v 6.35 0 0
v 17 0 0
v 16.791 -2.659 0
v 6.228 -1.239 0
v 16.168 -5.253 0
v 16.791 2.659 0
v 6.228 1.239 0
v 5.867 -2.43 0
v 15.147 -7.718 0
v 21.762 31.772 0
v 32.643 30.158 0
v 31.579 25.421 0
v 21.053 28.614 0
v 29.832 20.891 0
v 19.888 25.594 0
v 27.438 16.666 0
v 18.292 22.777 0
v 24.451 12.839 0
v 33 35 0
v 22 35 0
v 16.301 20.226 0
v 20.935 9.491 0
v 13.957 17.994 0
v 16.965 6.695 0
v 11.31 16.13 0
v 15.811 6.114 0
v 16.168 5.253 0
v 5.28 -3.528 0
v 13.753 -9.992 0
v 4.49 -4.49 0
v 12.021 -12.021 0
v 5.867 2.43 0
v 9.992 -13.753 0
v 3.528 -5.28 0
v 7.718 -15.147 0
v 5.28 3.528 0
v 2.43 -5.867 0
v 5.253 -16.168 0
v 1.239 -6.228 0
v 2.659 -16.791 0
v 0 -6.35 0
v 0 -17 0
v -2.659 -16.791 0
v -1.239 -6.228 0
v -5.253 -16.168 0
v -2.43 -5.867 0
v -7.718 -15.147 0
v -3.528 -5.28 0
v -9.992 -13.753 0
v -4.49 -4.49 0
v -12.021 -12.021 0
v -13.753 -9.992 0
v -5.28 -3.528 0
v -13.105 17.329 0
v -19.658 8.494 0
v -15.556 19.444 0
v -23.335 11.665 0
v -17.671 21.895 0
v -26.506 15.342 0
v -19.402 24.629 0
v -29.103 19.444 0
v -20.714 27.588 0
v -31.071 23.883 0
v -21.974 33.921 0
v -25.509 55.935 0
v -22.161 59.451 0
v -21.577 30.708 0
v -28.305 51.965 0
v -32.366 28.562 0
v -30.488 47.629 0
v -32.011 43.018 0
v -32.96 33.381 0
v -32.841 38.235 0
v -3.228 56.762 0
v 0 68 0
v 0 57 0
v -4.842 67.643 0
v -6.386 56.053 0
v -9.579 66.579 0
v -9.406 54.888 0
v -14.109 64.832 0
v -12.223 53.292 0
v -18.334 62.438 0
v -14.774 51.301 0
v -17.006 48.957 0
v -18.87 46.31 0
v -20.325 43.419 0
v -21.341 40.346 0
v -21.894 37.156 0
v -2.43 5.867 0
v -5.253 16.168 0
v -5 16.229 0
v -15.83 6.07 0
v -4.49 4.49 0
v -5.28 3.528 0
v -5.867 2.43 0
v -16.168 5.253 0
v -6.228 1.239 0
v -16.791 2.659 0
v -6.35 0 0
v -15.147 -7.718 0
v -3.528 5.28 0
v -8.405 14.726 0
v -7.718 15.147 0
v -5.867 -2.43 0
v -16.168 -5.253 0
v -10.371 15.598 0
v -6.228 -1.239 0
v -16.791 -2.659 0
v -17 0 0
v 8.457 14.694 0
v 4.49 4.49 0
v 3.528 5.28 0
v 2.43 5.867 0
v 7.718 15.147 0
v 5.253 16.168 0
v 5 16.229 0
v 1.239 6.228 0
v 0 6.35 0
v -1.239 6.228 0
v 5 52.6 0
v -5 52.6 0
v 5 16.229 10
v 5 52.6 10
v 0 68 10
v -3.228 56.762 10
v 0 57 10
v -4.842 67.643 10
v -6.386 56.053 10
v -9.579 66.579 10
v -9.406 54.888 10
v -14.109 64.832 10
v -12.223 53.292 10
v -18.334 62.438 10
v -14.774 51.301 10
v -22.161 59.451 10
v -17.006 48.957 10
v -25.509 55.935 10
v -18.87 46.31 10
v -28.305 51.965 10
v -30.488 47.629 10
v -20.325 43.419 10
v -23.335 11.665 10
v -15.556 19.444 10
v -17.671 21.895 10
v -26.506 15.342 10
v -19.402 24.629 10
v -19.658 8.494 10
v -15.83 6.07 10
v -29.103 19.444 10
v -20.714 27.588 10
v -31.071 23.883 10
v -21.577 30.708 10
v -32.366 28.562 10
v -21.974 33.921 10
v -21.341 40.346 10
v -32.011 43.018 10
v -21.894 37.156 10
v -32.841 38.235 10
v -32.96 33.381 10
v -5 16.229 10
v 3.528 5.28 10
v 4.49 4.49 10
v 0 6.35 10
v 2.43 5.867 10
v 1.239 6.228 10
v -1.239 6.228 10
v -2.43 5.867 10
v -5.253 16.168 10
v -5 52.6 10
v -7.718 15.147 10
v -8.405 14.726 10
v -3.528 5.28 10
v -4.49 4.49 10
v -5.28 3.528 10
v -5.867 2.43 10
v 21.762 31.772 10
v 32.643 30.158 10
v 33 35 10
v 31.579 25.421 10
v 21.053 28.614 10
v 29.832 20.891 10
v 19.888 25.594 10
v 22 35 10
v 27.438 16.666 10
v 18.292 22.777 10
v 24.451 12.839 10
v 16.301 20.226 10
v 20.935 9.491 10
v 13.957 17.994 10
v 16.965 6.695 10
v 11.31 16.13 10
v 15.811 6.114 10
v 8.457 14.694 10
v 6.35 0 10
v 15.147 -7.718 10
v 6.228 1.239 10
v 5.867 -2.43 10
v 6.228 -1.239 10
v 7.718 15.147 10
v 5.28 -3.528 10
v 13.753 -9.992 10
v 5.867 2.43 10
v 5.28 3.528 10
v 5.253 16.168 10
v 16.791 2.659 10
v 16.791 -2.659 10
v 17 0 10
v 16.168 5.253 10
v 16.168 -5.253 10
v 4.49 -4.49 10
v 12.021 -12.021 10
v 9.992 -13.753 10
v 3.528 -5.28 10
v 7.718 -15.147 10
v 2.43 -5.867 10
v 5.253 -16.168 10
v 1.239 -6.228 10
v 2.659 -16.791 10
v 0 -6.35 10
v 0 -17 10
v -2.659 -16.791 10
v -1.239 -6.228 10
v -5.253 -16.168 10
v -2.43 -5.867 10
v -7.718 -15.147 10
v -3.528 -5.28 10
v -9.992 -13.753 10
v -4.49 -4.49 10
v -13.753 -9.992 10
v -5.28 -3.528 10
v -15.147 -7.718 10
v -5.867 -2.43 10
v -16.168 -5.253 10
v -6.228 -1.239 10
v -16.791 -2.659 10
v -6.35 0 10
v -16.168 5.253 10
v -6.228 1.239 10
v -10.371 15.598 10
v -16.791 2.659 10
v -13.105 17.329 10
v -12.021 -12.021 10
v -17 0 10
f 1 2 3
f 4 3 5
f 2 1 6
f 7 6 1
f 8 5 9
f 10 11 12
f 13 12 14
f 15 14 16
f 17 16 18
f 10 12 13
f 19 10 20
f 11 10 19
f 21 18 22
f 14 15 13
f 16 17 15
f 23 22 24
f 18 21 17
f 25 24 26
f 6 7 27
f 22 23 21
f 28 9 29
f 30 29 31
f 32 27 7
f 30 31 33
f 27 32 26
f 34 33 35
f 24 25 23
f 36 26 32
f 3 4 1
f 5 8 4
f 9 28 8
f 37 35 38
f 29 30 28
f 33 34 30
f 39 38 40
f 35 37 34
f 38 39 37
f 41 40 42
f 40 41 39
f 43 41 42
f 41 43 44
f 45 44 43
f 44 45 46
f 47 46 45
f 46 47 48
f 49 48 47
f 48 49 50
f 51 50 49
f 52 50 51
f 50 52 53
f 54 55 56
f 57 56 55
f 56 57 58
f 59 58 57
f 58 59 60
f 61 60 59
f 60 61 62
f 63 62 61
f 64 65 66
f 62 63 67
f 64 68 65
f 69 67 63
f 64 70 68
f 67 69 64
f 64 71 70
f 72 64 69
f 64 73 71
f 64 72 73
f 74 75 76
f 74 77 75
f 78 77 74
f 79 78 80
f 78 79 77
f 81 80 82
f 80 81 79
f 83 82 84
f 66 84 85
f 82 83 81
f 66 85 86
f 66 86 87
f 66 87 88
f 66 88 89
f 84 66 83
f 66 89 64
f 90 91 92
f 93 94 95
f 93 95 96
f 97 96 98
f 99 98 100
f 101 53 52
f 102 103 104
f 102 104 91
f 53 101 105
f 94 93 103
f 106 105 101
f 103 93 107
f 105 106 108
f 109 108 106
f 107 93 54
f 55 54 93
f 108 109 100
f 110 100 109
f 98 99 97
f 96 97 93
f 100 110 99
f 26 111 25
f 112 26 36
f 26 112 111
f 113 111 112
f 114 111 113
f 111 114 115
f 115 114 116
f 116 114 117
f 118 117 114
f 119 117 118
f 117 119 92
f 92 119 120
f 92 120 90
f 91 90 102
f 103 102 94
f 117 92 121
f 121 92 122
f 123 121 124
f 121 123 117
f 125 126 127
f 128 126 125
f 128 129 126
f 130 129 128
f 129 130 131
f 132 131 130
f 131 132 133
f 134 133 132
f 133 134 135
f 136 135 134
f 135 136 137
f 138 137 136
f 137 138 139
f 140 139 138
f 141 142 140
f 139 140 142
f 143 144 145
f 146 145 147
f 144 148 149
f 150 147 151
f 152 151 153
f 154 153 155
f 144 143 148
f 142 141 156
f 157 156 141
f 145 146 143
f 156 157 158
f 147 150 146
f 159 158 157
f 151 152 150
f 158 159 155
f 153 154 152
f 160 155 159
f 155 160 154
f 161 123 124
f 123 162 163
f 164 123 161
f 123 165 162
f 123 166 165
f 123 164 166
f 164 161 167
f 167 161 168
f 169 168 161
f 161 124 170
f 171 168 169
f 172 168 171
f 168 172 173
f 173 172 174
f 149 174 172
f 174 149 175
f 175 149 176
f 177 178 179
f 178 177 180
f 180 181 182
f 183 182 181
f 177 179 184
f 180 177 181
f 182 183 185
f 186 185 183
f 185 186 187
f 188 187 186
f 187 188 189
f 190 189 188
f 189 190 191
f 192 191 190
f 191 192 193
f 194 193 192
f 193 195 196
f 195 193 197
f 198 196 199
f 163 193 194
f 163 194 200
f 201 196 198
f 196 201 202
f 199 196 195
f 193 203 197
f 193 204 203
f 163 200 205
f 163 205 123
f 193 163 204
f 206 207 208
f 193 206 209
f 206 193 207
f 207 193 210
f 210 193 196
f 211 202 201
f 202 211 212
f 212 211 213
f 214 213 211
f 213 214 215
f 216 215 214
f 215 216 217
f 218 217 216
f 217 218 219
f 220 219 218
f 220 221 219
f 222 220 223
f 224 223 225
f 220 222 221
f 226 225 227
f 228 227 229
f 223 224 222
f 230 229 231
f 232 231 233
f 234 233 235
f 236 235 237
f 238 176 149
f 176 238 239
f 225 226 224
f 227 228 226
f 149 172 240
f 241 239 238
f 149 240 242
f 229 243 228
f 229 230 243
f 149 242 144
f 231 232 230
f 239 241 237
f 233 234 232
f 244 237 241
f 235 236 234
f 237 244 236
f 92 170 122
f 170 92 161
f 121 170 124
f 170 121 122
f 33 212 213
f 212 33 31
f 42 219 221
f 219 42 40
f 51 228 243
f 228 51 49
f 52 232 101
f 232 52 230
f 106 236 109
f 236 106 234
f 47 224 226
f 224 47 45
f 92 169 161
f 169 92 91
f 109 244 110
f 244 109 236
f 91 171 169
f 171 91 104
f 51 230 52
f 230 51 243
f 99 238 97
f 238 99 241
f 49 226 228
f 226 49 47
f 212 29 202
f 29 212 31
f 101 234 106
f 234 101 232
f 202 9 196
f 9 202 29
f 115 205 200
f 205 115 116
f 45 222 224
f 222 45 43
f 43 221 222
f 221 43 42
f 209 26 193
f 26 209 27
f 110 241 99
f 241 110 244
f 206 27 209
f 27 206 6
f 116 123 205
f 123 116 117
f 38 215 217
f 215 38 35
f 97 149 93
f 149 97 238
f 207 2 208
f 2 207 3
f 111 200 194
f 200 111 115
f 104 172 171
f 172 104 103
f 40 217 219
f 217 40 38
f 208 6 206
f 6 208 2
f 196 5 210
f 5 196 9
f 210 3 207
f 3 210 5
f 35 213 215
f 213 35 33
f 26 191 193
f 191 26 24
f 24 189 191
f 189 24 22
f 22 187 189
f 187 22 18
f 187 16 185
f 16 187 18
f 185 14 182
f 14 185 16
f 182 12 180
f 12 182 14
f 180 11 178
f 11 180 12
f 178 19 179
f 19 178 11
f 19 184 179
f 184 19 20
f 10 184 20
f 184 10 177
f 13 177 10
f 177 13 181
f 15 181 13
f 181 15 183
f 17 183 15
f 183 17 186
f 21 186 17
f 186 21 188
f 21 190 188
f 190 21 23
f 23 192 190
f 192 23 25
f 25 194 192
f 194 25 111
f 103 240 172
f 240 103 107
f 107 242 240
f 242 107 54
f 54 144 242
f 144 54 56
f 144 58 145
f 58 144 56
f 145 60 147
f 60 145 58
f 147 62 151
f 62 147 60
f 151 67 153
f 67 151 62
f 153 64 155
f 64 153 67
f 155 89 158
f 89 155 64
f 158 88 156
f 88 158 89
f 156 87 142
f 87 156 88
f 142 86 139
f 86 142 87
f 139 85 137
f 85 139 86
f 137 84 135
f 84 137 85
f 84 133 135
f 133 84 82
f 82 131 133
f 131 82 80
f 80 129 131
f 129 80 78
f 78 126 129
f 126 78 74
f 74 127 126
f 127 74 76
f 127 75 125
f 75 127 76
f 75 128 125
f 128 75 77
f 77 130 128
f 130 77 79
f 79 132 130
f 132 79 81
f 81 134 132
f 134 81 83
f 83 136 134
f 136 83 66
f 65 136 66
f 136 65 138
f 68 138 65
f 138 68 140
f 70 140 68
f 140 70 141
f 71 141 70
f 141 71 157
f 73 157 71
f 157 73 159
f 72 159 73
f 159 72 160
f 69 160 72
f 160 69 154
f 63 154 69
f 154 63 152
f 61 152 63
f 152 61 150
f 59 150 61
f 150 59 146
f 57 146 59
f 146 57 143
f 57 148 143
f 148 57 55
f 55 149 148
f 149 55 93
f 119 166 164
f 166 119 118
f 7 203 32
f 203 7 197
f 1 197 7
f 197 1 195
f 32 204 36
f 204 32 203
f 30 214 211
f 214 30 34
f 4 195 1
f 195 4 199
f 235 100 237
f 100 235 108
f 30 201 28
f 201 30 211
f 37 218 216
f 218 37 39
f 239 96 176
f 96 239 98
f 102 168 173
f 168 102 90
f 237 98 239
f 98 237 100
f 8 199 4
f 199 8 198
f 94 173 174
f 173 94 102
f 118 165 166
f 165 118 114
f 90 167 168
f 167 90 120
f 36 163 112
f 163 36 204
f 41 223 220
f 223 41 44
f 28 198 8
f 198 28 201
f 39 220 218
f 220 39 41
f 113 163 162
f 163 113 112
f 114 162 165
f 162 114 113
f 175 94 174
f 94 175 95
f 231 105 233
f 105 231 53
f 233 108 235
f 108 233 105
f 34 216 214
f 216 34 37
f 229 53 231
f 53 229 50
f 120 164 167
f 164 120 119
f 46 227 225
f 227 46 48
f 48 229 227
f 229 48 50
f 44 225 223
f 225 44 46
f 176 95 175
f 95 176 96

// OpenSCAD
$fn = 32;

// ----------------------------------------------------------------------
// Hook: 70 mm shank into a 22 mm curl, 10 mm thick
// ----------------------------------------------------------------------

// --- parameters (mm) ---
shank_len = 70;           // shank length from the boss centre
shank_w = 10;             // shank width
boss_d = 34;              // boss diameter
bore_d = 12.7;            // boss bore
curl_in = 22;             // curl inner radius
curl_out = 33;            // curl outer radius
curl_sweep = 270;         // curl sweep angle
hook_t = 10;              // hook thickness

shank_profile = [[-5, 52.6], [5, 52.6], [5, 15], [-5, 15]];
boss_profile = [[17, 0], [16.791, 2.659], [16.168, 5.253], [15.147, 7.718], [13.753, 9.992], [12.021, 12.021], [9.992, 13.753], [7.718, 15.147], [5.253, 16.168], [2.659, 16.791], [0, 17], [-2.659, 16.791], [-5.253, 16.168], [-7.718, 15.147], [-9.992, 13.753], [-12.021, 12.021], [-13.753, 9.992], [-15.147, 7.718], [-16.168, 5.253], [-16.791, 2.659], [-17, 0], [-16.791, -2.659], [-16.168, -5.253], [-15.147, -7.718], [-13.753, -9.992], [-12.021, -12.021], [-9.992, -13.753], [-7.718, -15.147], [-5.253, -16.168], [-2.659, -16.791], [0, -17], [2.659, -16.791], [5.253, -16.168], [7.718, -15.147], [9.992, -13.753], [12.021, -12.021], [13.753, -9.992], [15.147, -7.718], [16.168, -5.253], [16.791, -2.659]];
curl_profile = [[0, 68], [-4.842, 67.643], [-9.579, 66.579], [-14.109, 64.832], [-18.334, 62.438], [-22.161, 59.451], [-25.509, 55.935], [-28.305, 51.965], [-30.488, 47.629], [-32.011, 43.018], [-32.841, 38.235], [-32.96, 33.381], [-32.366, 28.562], [-31.071, 23.883], [-29.103, 19.444], [-26.506, 15.342], [-23.335, 11.665], [-19.658, 8.494], [-15.556, 5.897], [-11.117, 3.929], [-6.438, 2.634], [-1.619, 2.04], [3.235, 2.159], [8.018, 2.989], [12.629, 4.512], [16.965, 6.695], [20.935, 9.491], [24.451, 12.839], [27.438, 16.666], [29.832, 20.891], [31.579, 25.421], [32.643, 30.158], [33, 35], [22, 35], [21.762, 31.772], [21.053, 28.614], [19.888, 25.594], [18.292, 22.777], [16.301, 20.226], [13.957, 17.994], [11.31, 16.13], [8.419, 14.675], [5.346, 13.659], [2.156, 13.106], [-1.079, 13.026], [-4.292, 13.423], [-7.412, 14.286], [-10.371, 15.598], [-13.105, 17.329], [-15.556, 19.444], [-17.671, 21.895], [-19.402, 24.629], [-20.714, 27.588], [-21.577, 30.708], [-21.974, 33.921], [-21.894, 37.156], [-21.341, 40.346], [-20.325, 43.419], [-18.87, 46.31], [-17.006, 48.957], [-14.774, 51.301], [-12.223, 53.292], [-9.406, 54.888], [-6.386, 56.053], [-3.228, 56.762], [0, 57]];

difference() {
  union() {
    /* three overlapping outlines: shank, boss and the smooth curl */
    linear_extrude(height = hook_t) polygon(shank_profile);
    linear_extrude(height = hook_t) polygon(boss_profile);
    linear_extrude(height = hook_t) polygon(curl_profile);
  }
  translate([0, 0, -2.5]) cylinder(h = hook_t + 5, d = bore_d);
}
